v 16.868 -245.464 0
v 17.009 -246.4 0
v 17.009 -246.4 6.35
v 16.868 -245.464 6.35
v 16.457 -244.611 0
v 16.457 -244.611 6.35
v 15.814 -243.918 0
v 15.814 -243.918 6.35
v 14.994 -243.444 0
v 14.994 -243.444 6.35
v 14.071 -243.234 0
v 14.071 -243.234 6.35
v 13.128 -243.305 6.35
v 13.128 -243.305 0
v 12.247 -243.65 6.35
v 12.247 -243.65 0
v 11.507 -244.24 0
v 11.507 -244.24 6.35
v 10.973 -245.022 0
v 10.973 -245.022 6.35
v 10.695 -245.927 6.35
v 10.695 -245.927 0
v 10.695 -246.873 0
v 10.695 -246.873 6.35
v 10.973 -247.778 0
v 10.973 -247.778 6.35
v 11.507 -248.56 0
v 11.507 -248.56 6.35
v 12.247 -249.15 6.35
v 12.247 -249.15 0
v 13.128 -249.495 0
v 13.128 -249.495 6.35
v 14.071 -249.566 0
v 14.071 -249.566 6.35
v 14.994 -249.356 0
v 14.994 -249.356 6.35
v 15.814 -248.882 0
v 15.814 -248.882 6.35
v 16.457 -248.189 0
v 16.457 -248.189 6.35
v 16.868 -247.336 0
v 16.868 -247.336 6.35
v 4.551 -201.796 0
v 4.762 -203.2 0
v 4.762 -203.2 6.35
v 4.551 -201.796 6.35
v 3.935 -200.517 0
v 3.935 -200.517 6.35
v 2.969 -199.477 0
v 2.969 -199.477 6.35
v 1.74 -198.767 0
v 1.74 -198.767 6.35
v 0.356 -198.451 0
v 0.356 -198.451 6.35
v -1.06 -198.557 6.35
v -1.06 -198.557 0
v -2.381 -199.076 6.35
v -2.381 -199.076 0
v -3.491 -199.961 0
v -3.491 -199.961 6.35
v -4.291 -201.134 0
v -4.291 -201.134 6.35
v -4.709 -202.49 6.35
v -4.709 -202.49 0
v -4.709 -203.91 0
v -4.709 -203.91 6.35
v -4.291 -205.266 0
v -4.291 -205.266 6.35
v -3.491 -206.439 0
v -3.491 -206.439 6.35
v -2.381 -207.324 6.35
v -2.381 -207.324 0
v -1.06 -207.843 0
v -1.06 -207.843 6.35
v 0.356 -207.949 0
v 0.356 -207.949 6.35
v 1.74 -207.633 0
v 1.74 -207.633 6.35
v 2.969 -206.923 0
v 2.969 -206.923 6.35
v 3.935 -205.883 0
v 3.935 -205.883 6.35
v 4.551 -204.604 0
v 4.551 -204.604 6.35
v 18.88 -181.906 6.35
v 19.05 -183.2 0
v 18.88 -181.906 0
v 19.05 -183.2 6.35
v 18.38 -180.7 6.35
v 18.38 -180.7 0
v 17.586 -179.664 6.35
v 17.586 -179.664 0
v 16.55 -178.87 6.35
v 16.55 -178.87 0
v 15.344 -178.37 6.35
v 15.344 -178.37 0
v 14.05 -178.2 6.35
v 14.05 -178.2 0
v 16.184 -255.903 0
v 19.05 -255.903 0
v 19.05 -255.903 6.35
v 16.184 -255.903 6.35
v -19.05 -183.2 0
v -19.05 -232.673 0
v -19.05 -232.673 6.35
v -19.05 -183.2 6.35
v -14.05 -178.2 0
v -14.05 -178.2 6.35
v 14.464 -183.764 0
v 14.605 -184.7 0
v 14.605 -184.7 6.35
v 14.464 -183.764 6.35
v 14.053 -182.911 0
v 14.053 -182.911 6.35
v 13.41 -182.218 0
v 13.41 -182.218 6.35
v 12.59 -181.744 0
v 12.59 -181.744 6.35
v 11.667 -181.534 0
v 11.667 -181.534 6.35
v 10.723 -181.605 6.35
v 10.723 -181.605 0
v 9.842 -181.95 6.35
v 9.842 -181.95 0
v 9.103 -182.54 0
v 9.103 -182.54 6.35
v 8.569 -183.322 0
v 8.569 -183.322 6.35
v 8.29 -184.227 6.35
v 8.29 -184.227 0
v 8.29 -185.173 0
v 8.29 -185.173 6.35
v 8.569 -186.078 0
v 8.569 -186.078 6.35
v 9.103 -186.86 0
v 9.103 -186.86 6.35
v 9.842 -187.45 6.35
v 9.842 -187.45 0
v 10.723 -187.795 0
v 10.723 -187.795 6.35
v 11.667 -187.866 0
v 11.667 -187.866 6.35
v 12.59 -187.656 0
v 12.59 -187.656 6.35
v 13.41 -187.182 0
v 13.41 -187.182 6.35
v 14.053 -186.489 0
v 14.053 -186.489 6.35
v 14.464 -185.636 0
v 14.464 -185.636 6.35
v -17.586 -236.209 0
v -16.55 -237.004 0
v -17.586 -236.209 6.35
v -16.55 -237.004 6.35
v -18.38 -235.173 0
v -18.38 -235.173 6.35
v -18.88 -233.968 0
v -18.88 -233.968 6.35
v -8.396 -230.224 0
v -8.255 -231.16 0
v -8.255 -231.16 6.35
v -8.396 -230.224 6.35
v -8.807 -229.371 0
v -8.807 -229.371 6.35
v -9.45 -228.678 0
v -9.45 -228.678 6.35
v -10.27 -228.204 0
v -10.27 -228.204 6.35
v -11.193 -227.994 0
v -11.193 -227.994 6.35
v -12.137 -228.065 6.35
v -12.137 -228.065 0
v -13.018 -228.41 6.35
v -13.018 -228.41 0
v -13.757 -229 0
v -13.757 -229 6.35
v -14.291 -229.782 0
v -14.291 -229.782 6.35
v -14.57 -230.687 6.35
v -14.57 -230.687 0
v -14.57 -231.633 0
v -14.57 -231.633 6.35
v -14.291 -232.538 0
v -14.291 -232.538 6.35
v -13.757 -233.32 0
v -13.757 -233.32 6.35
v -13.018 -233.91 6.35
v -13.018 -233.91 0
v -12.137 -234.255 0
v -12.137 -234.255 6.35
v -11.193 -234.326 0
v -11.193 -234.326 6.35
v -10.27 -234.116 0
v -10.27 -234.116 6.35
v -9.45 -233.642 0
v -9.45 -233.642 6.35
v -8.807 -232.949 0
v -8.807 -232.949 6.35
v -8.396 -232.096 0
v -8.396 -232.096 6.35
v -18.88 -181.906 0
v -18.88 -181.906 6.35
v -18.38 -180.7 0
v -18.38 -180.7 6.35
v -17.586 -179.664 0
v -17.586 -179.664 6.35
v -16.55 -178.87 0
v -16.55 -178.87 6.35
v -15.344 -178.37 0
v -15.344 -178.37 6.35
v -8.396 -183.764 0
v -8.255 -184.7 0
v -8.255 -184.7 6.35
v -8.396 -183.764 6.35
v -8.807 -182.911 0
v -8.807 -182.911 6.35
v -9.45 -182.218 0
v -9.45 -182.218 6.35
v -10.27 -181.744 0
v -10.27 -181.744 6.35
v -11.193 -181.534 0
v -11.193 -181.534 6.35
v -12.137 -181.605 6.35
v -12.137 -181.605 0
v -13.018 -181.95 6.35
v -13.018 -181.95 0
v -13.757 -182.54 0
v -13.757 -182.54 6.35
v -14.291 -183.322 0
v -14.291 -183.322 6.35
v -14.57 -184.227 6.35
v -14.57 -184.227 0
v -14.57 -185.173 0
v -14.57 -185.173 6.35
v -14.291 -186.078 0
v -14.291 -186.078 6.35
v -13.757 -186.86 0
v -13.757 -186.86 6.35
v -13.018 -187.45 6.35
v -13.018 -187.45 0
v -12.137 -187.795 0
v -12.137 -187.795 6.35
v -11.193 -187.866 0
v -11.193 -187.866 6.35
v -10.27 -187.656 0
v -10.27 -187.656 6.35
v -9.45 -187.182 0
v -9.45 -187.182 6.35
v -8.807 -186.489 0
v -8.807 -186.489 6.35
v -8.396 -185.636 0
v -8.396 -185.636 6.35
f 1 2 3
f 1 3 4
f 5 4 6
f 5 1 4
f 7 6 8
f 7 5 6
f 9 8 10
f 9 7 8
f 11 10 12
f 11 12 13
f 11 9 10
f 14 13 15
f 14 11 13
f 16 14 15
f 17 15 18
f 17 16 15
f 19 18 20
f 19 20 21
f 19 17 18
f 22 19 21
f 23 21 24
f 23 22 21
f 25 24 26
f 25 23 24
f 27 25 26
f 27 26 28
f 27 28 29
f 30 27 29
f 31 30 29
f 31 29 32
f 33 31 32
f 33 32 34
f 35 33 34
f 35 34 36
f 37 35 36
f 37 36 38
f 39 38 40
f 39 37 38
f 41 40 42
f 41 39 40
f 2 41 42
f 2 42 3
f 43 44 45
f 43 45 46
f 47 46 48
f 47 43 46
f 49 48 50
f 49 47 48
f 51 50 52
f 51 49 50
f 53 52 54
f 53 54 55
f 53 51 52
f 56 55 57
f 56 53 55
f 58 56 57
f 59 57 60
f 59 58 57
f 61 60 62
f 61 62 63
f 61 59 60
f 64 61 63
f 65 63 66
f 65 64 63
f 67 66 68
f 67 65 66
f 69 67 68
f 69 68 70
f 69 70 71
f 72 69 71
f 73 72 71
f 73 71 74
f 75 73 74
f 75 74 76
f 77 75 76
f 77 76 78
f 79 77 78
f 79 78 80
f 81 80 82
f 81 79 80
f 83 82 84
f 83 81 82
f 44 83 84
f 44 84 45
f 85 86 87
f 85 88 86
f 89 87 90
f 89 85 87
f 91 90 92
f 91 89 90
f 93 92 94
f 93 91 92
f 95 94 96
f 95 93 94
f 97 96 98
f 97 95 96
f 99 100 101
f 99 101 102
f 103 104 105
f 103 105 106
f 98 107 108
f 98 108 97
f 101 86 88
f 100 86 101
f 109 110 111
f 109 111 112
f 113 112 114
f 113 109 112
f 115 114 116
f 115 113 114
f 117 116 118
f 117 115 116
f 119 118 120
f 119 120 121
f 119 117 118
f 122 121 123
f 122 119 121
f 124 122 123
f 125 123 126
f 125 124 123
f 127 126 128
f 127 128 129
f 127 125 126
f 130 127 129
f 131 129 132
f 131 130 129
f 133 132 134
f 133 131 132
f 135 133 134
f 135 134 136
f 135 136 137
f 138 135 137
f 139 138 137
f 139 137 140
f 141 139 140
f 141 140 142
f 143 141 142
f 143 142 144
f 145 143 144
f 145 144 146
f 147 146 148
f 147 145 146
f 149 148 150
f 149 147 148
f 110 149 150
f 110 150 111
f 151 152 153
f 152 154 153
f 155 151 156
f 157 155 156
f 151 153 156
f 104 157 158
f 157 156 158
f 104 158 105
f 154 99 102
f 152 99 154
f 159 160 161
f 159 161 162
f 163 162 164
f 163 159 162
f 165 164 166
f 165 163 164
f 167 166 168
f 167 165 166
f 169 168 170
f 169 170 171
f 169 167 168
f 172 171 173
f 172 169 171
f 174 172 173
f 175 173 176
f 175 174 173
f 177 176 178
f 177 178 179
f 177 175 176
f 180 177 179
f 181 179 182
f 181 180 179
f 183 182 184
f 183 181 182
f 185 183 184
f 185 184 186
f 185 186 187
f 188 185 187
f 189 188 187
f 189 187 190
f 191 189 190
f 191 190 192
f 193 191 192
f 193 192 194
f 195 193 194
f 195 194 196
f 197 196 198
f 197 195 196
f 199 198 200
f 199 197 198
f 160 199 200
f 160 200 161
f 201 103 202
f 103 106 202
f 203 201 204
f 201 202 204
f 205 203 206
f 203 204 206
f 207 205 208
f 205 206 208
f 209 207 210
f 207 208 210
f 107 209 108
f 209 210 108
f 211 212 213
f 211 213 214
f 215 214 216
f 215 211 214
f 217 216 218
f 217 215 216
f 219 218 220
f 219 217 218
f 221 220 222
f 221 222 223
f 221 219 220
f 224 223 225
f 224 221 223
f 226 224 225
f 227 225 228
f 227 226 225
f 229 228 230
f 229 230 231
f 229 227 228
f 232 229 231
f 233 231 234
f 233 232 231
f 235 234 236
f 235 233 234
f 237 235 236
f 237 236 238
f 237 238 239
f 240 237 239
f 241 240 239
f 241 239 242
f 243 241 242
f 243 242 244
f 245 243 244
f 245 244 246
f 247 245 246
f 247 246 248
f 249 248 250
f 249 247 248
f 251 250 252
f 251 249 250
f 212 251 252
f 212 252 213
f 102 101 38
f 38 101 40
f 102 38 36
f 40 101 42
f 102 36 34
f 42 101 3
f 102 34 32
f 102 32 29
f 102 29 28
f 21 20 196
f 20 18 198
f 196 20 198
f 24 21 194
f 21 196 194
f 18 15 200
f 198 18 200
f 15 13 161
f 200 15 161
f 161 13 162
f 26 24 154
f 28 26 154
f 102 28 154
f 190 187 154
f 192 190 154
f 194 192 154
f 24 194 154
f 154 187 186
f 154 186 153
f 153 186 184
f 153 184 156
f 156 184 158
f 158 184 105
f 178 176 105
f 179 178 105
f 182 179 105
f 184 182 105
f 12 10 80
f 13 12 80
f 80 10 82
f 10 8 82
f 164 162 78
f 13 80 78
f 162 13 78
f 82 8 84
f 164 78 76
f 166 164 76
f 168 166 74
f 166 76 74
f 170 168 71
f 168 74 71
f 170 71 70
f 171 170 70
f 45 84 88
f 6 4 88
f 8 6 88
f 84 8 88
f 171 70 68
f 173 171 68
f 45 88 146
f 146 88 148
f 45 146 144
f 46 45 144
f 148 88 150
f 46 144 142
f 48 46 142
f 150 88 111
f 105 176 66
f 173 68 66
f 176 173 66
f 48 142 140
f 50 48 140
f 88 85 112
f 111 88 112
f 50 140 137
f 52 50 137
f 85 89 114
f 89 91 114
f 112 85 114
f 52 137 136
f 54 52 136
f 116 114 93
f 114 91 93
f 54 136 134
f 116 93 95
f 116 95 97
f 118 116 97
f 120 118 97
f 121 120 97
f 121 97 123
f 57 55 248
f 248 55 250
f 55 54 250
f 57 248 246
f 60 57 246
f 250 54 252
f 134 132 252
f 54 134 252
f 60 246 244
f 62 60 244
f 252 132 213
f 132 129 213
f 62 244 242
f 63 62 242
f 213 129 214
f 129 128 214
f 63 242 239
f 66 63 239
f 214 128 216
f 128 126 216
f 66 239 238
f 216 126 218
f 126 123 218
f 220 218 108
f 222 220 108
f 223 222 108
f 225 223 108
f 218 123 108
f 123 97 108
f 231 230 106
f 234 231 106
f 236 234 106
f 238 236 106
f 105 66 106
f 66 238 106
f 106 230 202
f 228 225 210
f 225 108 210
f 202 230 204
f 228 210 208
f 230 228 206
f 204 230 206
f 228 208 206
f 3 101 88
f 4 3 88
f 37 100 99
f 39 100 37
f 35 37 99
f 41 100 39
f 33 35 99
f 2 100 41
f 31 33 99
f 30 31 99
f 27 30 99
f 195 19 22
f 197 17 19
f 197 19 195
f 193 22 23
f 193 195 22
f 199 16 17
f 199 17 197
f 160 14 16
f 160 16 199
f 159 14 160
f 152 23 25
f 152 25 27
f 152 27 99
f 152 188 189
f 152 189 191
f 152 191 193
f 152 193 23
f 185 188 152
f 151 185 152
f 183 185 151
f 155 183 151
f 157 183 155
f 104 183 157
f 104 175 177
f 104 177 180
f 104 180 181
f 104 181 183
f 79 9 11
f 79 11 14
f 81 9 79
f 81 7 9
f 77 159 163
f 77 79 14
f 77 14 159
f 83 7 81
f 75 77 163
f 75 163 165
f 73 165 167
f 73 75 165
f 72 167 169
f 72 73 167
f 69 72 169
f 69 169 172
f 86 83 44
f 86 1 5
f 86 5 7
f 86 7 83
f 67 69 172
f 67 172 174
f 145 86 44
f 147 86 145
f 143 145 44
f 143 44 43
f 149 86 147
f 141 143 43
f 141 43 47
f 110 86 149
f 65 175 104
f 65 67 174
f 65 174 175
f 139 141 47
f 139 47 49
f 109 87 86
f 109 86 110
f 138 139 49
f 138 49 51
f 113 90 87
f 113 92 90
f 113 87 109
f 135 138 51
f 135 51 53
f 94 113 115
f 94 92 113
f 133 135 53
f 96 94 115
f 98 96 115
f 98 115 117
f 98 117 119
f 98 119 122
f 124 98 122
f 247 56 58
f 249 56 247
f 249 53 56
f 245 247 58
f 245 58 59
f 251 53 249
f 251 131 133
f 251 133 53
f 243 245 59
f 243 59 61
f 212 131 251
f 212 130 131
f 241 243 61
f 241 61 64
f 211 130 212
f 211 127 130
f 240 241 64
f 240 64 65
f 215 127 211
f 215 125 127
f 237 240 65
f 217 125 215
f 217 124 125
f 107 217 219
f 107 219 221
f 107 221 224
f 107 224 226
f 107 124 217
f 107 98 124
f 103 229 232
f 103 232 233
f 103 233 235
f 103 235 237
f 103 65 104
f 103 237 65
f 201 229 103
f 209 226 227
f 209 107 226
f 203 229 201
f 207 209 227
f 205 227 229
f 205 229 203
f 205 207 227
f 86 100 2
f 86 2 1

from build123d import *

# Parameters (mm, degrees)
SKETCH1_R           = 3.175
SKETCH1_R_2         = 4.7625
BOSS_EXTRUDE1_DEPTH = 6.35
FILLET1_R           = 5


with BuildPart() as part:
    # Sketch1 → Boss-Extrude1 (new body)
    with BuildSketch(Plane.XY):
        Polygon((16.184070214, -255.902577388), (-19.05, -235.560177465), (-19.05, -178.2), (19.05, -178.2), (19.05, -255.902577388), align=None)
        with Locations((13.834070214, -246.4)):
            Circle(SKETCH1_R, mode=Mode.SUBTRACT)
        with Locations((-11.43, -231.16)):
            Circle(SKETCH1_R, mode=Mode.SUBTRACT)
        with Locations((0, -203.2)):
            Circle(SKETCH1_R_2, mode=Mode.SUBTRACT)
        with Locations((-11.43, -184.7)):
            Circle(SKETCH1_R, mode=Mode.SUBTRACT)
        with Locations((11.43, -184.7)):
            Circle(SKETCH1_R, mode=Mode.SUBTRACT)
    extrude(amount=BOSS_EXTRUDE1_DEPTH)

    # Fillet1
    fillet1_edges = [part.edges().sort_by_distance(p)[0] for p in [
        (-19.05, -235.560177465, 3.175),
        (-19.05, -178.2, 3.175),
        (19.05, -178.2, 3.175),
    ]]
    fillet(fillet1_edges, radius=FILLET1_R)


solid = part.part
